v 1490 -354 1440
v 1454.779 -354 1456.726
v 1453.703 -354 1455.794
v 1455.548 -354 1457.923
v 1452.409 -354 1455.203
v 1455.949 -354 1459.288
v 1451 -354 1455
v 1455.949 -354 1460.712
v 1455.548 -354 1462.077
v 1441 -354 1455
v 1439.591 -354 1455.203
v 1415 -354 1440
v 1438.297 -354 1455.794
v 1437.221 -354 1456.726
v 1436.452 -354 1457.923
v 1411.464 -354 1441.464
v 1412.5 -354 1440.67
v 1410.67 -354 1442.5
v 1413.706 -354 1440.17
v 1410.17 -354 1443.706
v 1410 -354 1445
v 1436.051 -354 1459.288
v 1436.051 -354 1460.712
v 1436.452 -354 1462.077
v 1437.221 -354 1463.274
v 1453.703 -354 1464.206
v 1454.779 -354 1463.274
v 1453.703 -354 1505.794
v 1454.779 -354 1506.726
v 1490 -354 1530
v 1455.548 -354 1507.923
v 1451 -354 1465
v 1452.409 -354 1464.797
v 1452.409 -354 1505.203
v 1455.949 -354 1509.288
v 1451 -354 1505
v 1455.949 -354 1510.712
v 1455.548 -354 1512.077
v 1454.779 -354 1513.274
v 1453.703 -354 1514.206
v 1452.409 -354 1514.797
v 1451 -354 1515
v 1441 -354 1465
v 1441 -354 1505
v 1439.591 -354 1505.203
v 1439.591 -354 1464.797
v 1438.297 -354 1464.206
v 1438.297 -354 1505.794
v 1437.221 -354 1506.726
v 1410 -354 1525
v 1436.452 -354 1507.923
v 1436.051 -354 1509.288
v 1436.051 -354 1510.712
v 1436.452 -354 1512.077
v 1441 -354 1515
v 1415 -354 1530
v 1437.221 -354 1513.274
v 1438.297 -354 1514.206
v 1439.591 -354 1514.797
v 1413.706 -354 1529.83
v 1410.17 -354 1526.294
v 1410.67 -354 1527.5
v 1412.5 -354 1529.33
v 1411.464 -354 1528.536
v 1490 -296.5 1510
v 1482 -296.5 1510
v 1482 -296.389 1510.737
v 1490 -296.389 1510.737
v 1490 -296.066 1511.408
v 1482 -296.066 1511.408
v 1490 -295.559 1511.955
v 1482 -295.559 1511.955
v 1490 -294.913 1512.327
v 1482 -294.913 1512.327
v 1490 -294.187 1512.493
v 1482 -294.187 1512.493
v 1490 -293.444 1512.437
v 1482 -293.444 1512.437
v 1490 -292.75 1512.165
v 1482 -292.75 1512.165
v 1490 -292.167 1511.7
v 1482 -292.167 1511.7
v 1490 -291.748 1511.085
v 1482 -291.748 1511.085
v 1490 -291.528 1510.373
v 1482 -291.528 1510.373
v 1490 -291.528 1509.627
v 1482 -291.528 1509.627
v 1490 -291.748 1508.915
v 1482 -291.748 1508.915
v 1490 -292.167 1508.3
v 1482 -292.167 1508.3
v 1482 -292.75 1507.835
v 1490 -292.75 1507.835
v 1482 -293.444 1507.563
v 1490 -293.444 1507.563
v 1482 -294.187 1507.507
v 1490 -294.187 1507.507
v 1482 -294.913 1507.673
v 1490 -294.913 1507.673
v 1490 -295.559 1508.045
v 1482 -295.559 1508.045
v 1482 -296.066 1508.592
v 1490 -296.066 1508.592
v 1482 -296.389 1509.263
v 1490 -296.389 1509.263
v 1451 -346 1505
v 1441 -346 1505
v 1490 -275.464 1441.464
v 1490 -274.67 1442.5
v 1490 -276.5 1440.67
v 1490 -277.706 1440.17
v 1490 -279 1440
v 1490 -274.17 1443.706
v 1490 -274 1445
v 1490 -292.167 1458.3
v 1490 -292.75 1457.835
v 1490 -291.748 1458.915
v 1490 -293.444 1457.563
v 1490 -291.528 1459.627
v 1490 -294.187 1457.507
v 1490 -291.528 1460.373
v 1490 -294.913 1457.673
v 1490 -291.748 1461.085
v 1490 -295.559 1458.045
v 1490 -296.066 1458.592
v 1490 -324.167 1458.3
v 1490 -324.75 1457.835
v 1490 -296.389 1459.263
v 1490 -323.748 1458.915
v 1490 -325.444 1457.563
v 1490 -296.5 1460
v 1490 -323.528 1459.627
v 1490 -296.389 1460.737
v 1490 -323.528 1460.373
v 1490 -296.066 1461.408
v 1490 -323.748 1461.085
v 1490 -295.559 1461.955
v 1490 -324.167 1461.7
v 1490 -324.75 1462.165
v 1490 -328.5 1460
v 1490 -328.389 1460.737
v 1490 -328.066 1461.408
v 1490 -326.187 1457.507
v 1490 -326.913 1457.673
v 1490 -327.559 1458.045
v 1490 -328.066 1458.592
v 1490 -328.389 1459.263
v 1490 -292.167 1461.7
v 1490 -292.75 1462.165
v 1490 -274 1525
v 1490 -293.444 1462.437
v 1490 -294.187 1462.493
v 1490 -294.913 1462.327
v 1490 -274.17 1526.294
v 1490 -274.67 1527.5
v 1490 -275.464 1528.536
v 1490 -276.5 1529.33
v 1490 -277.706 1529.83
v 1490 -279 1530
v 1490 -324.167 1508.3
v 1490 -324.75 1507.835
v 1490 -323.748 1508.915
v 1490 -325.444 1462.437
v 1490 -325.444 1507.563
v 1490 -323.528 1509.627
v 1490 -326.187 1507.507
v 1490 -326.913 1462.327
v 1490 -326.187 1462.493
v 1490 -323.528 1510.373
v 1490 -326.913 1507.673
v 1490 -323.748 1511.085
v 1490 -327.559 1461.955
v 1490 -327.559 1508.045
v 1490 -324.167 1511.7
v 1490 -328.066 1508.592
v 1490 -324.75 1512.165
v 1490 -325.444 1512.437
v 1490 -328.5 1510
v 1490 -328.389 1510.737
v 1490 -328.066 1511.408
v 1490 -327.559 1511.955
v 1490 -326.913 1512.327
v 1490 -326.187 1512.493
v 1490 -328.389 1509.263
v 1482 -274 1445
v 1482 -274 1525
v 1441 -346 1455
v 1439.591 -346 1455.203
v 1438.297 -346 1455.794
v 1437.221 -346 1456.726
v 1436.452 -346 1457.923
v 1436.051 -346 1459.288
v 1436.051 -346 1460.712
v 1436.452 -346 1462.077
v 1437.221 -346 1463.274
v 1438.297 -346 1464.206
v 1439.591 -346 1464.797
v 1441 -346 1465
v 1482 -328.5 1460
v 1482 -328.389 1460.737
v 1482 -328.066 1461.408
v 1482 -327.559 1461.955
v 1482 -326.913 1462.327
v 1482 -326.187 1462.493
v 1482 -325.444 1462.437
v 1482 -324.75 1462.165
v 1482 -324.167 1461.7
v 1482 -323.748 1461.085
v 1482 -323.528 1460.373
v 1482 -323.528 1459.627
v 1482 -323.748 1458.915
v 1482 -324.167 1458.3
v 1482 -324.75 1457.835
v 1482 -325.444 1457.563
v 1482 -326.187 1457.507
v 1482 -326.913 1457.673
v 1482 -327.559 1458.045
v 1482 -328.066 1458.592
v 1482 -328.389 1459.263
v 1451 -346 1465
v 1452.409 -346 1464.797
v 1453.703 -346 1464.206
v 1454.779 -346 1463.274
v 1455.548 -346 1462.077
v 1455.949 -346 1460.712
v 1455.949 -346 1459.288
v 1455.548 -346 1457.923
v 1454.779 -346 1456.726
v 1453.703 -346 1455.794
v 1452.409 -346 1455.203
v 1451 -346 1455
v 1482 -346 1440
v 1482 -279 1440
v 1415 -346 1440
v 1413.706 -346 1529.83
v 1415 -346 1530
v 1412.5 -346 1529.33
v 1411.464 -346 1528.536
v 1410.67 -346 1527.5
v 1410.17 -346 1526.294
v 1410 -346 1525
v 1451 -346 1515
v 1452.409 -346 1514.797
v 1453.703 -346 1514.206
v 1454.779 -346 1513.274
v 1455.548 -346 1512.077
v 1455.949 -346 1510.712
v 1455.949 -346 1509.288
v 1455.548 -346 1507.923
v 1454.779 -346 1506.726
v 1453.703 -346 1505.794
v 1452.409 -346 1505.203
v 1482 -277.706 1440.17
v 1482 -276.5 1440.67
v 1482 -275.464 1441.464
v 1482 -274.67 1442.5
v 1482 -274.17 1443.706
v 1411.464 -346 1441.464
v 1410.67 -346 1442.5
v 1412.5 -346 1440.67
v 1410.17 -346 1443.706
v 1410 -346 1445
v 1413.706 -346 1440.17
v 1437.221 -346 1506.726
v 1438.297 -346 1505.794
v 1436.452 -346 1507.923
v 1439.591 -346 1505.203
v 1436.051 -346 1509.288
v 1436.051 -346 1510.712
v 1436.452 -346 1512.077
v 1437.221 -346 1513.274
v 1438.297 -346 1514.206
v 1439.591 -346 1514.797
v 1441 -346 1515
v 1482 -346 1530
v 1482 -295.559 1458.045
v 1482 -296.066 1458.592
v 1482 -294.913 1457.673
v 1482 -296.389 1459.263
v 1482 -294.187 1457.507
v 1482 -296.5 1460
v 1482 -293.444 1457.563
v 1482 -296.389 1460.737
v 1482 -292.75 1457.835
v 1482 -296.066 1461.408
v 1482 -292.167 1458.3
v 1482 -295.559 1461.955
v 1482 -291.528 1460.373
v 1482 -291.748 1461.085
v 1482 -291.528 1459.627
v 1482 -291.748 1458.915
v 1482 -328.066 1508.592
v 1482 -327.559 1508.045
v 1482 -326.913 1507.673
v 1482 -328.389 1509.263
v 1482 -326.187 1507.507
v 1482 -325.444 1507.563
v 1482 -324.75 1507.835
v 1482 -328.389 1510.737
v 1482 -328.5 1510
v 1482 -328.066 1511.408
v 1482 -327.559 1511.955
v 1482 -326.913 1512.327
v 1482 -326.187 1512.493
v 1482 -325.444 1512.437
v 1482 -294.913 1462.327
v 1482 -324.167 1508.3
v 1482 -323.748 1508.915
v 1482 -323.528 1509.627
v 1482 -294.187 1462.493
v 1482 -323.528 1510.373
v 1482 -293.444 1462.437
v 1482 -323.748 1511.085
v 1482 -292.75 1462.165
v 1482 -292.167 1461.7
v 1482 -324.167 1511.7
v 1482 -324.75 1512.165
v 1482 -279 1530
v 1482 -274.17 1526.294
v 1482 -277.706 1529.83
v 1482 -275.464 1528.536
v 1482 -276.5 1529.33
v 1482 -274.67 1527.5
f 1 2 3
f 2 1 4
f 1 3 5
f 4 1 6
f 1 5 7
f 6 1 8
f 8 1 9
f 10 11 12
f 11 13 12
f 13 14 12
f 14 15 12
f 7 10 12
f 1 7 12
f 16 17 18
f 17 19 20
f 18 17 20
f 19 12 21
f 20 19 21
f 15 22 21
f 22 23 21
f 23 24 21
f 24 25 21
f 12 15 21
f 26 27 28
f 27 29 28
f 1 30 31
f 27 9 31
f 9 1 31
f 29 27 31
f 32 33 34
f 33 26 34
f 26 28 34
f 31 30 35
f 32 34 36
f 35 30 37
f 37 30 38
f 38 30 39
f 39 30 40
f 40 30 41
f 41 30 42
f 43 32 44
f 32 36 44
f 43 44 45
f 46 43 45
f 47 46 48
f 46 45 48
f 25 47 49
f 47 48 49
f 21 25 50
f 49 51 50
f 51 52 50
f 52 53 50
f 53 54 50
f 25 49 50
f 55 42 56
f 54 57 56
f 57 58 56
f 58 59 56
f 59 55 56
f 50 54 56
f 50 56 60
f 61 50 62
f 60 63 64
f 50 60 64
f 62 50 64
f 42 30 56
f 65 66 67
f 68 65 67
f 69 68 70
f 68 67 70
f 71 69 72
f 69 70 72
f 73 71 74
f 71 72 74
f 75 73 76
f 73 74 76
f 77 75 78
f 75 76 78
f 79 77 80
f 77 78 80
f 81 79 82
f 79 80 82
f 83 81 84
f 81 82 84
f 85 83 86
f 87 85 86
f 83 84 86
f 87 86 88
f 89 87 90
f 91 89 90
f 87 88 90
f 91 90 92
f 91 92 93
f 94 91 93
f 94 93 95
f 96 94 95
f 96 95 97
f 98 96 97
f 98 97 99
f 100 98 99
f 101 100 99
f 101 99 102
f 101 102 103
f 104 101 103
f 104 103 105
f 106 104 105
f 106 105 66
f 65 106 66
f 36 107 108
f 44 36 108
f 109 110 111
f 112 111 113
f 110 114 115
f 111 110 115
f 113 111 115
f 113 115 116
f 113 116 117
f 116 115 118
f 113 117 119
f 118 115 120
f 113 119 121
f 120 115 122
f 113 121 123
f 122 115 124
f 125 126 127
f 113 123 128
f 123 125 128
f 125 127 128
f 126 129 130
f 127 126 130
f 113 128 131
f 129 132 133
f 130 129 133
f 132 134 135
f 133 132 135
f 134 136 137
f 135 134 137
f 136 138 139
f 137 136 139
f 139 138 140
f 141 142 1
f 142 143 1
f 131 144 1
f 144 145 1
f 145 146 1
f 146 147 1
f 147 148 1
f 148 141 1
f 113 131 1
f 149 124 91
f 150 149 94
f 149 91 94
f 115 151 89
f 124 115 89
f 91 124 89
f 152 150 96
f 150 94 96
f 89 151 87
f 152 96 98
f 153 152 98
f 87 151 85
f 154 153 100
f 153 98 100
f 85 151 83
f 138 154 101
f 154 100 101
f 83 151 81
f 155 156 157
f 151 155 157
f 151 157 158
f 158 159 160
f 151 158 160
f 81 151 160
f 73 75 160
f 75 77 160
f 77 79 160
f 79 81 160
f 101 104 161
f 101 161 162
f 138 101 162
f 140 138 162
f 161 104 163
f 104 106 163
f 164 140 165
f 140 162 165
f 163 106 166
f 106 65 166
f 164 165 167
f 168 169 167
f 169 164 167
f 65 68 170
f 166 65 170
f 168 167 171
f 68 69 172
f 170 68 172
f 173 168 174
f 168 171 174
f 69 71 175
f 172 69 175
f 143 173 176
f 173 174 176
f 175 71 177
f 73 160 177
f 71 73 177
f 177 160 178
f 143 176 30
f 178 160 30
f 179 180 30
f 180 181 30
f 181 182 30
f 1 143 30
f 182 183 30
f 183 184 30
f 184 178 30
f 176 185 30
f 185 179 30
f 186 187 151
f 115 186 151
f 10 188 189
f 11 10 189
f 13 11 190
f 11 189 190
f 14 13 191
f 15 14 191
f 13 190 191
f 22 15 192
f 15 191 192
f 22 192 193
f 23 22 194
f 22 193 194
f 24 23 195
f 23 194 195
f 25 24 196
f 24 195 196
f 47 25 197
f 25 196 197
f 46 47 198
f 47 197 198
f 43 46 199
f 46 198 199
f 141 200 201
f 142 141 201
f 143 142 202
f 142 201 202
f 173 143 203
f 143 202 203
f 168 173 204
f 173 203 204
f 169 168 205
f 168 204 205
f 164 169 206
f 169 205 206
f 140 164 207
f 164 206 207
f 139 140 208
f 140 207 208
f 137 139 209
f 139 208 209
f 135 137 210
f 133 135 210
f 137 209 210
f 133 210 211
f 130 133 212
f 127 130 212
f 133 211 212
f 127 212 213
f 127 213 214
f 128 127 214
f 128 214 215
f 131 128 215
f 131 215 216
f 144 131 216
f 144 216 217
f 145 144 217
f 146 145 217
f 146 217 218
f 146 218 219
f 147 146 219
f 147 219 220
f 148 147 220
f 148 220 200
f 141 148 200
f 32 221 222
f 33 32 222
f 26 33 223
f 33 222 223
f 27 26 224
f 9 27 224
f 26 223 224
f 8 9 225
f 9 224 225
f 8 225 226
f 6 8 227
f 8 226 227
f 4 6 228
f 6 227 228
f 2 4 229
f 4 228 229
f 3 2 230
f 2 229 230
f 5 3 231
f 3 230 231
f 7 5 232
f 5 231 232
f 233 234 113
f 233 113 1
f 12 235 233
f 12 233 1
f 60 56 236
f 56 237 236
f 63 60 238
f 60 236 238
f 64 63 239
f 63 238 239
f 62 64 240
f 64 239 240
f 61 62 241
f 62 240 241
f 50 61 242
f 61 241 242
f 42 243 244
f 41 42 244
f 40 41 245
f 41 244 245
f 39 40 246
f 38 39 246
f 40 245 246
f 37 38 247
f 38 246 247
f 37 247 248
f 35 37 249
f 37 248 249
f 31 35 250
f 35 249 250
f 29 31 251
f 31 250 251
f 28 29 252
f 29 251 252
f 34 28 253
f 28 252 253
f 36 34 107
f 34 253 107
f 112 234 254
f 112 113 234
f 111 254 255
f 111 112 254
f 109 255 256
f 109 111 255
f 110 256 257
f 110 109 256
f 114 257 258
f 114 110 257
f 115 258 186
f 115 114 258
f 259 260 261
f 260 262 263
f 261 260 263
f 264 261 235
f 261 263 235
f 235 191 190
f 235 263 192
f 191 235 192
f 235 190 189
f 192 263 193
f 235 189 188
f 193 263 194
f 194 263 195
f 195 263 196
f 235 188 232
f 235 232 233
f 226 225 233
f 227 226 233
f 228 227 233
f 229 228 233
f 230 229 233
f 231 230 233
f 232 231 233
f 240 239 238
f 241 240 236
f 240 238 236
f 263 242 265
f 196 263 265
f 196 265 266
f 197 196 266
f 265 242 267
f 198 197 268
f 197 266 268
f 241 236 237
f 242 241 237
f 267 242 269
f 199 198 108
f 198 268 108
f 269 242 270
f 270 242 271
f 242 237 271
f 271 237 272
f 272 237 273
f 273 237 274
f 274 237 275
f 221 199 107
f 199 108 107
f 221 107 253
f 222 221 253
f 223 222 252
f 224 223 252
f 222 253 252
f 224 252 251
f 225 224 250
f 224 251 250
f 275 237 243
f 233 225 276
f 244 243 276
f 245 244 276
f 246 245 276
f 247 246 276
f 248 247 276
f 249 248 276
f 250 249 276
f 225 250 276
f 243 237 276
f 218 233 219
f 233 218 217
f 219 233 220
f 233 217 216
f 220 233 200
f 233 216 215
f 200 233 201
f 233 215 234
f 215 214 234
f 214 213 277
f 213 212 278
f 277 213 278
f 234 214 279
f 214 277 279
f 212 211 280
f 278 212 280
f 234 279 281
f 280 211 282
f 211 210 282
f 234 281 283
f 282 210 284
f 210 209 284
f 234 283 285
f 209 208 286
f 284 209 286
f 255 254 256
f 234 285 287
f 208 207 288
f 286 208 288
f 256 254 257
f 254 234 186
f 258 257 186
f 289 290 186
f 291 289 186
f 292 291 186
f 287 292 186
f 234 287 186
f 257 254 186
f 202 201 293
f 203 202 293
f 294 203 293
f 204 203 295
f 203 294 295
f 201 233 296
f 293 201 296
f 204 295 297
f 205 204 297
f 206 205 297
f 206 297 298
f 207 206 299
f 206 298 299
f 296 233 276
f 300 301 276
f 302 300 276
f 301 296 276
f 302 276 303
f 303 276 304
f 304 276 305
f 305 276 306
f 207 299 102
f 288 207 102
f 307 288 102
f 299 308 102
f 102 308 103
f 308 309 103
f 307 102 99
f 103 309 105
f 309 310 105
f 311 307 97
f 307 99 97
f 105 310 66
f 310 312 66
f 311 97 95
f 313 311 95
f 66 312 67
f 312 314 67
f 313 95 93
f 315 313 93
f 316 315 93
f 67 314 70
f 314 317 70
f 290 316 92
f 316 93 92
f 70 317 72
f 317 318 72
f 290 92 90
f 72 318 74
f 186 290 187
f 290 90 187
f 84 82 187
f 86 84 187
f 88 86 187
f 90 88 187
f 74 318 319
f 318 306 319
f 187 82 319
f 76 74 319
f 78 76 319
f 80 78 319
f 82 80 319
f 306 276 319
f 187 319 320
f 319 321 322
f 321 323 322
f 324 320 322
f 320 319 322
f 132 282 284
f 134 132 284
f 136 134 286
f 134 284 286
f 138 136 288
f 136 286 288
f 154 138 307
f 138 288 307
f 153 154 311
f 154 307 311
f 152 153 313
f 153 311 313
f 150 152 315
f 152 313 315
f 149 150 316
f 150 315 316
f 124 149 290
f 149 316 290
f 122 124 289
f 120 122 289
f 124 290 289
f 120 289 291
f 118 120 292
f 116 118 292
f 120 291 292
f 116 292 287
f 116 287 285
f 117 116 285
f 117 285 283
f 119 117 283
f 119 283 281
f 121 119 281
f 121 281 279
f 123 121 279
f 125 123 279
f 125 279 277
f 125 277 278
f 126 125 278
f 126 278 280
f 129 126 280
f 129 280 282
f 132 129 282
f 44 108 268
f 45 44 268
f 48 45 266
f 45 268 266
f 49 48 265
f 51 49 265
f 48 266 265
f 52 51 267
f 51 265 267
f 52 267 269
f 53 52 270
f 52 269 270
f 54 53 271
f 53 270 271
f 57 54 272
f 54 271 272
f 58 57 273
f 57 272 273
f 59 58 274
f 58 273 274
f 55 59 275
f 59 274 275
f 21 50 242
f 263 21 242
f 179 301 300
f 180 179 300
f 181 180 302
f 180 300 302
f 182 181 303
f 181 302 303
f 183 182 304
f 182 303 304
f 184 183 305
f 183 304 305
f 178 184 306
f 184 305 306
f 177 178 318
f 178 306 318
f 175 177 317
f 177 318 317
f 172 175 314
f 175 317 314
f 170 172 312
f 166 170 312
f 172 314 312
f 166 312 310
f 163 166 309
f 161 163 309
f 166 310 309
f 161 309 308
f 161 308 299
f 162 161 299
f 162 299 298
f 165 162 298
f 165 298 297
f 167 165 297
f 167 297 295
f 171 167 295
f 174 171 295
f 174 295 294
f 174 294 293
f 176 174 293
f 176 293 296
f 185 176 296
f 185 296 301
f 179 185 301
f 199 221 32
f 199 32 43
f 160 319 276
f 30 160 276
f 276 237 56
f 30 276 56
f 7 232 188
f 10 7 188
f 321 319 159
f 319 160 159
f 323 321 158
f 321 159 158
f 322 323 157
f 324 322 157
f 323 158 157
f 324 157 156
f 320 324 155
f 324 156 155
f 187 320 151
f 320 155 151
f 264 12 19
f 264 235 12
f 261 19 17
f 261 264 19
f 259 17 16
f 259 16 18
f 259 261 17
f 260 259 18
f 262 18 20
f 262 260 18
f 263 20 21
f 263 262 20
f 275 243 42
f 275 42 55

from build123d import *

# Parameters (mm, degrees)
PAD001_DEPTH            = 45
SKETCH_R                = 2.5
POCKET_DEPTH            = 8.001
POCKET001_DEPTH         = 8.001
FILLET001_R             = 5
BODY001_PLACEMENT_ANGLE = 90


with BuildPart() as part:
    # Sketch003 → Pad001 (new body, symmetric)
    with BuildSketch(Plane.XY):
        Polygon((0, 0), (0, 80), (8, 80), (8, 8), (80, 8), (80, 0), align=None)
    extrude(amount=PAD001_DEPTH, both=True)

    # Sketch (on Face4 of Pad001) → Pocket (cut, through all)
    with BuildSketch(Plane(origin=(0, 8, 0), x_dir=(-1, 0, 0), z_dir=(0, 1, 0))):
        with Locations((-60, 25)):
            Circle(SKETCH_R)
        with Locations((-28, -25)):
            Circle(SKETCH_R)
        with Locations((-28, 25)):
            Circle(SKETCH_R)
        with Locations((-60, -25)):
            Circle(SKETCH_R)
    extrude(amount=-POCKET_DEPTH, mode=Mode.SUBTRACT)

    # Sketch007 (on Face11 of Pocket) → Pocket001 (cut, through all)
    with BuildSketch(Plane.YZ.offset(8)):
        with BuildLine():
            ThreePointArc((39, 30), (34, 25), (39, 20))
            Line((39, 20), (49, 20))
            ThreePointArc((49, 20), (54, 25), (49, 30))
            Line((39, 30), (49, 30))
        make_face()
        with BuildLine():
            ThreePointArc((39, -20), (34, -25), (39, -30))
            Line((39, -30), (49, -30))
            ThreePointArc((49, -30), (54, -25), (49, -20))
            Line((39, -20), (49, -20))
        make_face()
    extrude(amount=-POCKET001_DEPTH, mode=Mode.SUBTRACT)

    # Fillet001
    fillet001_edges = [part.edges().sort_by_distance(p)[0] for p in [
        (4, 80, 45),
        (80, 4, 45),
        (4, 80, -45),
        (80, 4, -45),
    ]]
    fillet(fillet001_edges, radius=FILLET001_R)


with BuildPart() as part_1:
    # Body001 placement: moved
    add(part.part.moved(Location((1490, -354, 1485))).rotate(Axis((1490, -354, 1485), (0, 0, 1)), BODY001_PLACEMENT_ANGLE))


solid = part_1.part
